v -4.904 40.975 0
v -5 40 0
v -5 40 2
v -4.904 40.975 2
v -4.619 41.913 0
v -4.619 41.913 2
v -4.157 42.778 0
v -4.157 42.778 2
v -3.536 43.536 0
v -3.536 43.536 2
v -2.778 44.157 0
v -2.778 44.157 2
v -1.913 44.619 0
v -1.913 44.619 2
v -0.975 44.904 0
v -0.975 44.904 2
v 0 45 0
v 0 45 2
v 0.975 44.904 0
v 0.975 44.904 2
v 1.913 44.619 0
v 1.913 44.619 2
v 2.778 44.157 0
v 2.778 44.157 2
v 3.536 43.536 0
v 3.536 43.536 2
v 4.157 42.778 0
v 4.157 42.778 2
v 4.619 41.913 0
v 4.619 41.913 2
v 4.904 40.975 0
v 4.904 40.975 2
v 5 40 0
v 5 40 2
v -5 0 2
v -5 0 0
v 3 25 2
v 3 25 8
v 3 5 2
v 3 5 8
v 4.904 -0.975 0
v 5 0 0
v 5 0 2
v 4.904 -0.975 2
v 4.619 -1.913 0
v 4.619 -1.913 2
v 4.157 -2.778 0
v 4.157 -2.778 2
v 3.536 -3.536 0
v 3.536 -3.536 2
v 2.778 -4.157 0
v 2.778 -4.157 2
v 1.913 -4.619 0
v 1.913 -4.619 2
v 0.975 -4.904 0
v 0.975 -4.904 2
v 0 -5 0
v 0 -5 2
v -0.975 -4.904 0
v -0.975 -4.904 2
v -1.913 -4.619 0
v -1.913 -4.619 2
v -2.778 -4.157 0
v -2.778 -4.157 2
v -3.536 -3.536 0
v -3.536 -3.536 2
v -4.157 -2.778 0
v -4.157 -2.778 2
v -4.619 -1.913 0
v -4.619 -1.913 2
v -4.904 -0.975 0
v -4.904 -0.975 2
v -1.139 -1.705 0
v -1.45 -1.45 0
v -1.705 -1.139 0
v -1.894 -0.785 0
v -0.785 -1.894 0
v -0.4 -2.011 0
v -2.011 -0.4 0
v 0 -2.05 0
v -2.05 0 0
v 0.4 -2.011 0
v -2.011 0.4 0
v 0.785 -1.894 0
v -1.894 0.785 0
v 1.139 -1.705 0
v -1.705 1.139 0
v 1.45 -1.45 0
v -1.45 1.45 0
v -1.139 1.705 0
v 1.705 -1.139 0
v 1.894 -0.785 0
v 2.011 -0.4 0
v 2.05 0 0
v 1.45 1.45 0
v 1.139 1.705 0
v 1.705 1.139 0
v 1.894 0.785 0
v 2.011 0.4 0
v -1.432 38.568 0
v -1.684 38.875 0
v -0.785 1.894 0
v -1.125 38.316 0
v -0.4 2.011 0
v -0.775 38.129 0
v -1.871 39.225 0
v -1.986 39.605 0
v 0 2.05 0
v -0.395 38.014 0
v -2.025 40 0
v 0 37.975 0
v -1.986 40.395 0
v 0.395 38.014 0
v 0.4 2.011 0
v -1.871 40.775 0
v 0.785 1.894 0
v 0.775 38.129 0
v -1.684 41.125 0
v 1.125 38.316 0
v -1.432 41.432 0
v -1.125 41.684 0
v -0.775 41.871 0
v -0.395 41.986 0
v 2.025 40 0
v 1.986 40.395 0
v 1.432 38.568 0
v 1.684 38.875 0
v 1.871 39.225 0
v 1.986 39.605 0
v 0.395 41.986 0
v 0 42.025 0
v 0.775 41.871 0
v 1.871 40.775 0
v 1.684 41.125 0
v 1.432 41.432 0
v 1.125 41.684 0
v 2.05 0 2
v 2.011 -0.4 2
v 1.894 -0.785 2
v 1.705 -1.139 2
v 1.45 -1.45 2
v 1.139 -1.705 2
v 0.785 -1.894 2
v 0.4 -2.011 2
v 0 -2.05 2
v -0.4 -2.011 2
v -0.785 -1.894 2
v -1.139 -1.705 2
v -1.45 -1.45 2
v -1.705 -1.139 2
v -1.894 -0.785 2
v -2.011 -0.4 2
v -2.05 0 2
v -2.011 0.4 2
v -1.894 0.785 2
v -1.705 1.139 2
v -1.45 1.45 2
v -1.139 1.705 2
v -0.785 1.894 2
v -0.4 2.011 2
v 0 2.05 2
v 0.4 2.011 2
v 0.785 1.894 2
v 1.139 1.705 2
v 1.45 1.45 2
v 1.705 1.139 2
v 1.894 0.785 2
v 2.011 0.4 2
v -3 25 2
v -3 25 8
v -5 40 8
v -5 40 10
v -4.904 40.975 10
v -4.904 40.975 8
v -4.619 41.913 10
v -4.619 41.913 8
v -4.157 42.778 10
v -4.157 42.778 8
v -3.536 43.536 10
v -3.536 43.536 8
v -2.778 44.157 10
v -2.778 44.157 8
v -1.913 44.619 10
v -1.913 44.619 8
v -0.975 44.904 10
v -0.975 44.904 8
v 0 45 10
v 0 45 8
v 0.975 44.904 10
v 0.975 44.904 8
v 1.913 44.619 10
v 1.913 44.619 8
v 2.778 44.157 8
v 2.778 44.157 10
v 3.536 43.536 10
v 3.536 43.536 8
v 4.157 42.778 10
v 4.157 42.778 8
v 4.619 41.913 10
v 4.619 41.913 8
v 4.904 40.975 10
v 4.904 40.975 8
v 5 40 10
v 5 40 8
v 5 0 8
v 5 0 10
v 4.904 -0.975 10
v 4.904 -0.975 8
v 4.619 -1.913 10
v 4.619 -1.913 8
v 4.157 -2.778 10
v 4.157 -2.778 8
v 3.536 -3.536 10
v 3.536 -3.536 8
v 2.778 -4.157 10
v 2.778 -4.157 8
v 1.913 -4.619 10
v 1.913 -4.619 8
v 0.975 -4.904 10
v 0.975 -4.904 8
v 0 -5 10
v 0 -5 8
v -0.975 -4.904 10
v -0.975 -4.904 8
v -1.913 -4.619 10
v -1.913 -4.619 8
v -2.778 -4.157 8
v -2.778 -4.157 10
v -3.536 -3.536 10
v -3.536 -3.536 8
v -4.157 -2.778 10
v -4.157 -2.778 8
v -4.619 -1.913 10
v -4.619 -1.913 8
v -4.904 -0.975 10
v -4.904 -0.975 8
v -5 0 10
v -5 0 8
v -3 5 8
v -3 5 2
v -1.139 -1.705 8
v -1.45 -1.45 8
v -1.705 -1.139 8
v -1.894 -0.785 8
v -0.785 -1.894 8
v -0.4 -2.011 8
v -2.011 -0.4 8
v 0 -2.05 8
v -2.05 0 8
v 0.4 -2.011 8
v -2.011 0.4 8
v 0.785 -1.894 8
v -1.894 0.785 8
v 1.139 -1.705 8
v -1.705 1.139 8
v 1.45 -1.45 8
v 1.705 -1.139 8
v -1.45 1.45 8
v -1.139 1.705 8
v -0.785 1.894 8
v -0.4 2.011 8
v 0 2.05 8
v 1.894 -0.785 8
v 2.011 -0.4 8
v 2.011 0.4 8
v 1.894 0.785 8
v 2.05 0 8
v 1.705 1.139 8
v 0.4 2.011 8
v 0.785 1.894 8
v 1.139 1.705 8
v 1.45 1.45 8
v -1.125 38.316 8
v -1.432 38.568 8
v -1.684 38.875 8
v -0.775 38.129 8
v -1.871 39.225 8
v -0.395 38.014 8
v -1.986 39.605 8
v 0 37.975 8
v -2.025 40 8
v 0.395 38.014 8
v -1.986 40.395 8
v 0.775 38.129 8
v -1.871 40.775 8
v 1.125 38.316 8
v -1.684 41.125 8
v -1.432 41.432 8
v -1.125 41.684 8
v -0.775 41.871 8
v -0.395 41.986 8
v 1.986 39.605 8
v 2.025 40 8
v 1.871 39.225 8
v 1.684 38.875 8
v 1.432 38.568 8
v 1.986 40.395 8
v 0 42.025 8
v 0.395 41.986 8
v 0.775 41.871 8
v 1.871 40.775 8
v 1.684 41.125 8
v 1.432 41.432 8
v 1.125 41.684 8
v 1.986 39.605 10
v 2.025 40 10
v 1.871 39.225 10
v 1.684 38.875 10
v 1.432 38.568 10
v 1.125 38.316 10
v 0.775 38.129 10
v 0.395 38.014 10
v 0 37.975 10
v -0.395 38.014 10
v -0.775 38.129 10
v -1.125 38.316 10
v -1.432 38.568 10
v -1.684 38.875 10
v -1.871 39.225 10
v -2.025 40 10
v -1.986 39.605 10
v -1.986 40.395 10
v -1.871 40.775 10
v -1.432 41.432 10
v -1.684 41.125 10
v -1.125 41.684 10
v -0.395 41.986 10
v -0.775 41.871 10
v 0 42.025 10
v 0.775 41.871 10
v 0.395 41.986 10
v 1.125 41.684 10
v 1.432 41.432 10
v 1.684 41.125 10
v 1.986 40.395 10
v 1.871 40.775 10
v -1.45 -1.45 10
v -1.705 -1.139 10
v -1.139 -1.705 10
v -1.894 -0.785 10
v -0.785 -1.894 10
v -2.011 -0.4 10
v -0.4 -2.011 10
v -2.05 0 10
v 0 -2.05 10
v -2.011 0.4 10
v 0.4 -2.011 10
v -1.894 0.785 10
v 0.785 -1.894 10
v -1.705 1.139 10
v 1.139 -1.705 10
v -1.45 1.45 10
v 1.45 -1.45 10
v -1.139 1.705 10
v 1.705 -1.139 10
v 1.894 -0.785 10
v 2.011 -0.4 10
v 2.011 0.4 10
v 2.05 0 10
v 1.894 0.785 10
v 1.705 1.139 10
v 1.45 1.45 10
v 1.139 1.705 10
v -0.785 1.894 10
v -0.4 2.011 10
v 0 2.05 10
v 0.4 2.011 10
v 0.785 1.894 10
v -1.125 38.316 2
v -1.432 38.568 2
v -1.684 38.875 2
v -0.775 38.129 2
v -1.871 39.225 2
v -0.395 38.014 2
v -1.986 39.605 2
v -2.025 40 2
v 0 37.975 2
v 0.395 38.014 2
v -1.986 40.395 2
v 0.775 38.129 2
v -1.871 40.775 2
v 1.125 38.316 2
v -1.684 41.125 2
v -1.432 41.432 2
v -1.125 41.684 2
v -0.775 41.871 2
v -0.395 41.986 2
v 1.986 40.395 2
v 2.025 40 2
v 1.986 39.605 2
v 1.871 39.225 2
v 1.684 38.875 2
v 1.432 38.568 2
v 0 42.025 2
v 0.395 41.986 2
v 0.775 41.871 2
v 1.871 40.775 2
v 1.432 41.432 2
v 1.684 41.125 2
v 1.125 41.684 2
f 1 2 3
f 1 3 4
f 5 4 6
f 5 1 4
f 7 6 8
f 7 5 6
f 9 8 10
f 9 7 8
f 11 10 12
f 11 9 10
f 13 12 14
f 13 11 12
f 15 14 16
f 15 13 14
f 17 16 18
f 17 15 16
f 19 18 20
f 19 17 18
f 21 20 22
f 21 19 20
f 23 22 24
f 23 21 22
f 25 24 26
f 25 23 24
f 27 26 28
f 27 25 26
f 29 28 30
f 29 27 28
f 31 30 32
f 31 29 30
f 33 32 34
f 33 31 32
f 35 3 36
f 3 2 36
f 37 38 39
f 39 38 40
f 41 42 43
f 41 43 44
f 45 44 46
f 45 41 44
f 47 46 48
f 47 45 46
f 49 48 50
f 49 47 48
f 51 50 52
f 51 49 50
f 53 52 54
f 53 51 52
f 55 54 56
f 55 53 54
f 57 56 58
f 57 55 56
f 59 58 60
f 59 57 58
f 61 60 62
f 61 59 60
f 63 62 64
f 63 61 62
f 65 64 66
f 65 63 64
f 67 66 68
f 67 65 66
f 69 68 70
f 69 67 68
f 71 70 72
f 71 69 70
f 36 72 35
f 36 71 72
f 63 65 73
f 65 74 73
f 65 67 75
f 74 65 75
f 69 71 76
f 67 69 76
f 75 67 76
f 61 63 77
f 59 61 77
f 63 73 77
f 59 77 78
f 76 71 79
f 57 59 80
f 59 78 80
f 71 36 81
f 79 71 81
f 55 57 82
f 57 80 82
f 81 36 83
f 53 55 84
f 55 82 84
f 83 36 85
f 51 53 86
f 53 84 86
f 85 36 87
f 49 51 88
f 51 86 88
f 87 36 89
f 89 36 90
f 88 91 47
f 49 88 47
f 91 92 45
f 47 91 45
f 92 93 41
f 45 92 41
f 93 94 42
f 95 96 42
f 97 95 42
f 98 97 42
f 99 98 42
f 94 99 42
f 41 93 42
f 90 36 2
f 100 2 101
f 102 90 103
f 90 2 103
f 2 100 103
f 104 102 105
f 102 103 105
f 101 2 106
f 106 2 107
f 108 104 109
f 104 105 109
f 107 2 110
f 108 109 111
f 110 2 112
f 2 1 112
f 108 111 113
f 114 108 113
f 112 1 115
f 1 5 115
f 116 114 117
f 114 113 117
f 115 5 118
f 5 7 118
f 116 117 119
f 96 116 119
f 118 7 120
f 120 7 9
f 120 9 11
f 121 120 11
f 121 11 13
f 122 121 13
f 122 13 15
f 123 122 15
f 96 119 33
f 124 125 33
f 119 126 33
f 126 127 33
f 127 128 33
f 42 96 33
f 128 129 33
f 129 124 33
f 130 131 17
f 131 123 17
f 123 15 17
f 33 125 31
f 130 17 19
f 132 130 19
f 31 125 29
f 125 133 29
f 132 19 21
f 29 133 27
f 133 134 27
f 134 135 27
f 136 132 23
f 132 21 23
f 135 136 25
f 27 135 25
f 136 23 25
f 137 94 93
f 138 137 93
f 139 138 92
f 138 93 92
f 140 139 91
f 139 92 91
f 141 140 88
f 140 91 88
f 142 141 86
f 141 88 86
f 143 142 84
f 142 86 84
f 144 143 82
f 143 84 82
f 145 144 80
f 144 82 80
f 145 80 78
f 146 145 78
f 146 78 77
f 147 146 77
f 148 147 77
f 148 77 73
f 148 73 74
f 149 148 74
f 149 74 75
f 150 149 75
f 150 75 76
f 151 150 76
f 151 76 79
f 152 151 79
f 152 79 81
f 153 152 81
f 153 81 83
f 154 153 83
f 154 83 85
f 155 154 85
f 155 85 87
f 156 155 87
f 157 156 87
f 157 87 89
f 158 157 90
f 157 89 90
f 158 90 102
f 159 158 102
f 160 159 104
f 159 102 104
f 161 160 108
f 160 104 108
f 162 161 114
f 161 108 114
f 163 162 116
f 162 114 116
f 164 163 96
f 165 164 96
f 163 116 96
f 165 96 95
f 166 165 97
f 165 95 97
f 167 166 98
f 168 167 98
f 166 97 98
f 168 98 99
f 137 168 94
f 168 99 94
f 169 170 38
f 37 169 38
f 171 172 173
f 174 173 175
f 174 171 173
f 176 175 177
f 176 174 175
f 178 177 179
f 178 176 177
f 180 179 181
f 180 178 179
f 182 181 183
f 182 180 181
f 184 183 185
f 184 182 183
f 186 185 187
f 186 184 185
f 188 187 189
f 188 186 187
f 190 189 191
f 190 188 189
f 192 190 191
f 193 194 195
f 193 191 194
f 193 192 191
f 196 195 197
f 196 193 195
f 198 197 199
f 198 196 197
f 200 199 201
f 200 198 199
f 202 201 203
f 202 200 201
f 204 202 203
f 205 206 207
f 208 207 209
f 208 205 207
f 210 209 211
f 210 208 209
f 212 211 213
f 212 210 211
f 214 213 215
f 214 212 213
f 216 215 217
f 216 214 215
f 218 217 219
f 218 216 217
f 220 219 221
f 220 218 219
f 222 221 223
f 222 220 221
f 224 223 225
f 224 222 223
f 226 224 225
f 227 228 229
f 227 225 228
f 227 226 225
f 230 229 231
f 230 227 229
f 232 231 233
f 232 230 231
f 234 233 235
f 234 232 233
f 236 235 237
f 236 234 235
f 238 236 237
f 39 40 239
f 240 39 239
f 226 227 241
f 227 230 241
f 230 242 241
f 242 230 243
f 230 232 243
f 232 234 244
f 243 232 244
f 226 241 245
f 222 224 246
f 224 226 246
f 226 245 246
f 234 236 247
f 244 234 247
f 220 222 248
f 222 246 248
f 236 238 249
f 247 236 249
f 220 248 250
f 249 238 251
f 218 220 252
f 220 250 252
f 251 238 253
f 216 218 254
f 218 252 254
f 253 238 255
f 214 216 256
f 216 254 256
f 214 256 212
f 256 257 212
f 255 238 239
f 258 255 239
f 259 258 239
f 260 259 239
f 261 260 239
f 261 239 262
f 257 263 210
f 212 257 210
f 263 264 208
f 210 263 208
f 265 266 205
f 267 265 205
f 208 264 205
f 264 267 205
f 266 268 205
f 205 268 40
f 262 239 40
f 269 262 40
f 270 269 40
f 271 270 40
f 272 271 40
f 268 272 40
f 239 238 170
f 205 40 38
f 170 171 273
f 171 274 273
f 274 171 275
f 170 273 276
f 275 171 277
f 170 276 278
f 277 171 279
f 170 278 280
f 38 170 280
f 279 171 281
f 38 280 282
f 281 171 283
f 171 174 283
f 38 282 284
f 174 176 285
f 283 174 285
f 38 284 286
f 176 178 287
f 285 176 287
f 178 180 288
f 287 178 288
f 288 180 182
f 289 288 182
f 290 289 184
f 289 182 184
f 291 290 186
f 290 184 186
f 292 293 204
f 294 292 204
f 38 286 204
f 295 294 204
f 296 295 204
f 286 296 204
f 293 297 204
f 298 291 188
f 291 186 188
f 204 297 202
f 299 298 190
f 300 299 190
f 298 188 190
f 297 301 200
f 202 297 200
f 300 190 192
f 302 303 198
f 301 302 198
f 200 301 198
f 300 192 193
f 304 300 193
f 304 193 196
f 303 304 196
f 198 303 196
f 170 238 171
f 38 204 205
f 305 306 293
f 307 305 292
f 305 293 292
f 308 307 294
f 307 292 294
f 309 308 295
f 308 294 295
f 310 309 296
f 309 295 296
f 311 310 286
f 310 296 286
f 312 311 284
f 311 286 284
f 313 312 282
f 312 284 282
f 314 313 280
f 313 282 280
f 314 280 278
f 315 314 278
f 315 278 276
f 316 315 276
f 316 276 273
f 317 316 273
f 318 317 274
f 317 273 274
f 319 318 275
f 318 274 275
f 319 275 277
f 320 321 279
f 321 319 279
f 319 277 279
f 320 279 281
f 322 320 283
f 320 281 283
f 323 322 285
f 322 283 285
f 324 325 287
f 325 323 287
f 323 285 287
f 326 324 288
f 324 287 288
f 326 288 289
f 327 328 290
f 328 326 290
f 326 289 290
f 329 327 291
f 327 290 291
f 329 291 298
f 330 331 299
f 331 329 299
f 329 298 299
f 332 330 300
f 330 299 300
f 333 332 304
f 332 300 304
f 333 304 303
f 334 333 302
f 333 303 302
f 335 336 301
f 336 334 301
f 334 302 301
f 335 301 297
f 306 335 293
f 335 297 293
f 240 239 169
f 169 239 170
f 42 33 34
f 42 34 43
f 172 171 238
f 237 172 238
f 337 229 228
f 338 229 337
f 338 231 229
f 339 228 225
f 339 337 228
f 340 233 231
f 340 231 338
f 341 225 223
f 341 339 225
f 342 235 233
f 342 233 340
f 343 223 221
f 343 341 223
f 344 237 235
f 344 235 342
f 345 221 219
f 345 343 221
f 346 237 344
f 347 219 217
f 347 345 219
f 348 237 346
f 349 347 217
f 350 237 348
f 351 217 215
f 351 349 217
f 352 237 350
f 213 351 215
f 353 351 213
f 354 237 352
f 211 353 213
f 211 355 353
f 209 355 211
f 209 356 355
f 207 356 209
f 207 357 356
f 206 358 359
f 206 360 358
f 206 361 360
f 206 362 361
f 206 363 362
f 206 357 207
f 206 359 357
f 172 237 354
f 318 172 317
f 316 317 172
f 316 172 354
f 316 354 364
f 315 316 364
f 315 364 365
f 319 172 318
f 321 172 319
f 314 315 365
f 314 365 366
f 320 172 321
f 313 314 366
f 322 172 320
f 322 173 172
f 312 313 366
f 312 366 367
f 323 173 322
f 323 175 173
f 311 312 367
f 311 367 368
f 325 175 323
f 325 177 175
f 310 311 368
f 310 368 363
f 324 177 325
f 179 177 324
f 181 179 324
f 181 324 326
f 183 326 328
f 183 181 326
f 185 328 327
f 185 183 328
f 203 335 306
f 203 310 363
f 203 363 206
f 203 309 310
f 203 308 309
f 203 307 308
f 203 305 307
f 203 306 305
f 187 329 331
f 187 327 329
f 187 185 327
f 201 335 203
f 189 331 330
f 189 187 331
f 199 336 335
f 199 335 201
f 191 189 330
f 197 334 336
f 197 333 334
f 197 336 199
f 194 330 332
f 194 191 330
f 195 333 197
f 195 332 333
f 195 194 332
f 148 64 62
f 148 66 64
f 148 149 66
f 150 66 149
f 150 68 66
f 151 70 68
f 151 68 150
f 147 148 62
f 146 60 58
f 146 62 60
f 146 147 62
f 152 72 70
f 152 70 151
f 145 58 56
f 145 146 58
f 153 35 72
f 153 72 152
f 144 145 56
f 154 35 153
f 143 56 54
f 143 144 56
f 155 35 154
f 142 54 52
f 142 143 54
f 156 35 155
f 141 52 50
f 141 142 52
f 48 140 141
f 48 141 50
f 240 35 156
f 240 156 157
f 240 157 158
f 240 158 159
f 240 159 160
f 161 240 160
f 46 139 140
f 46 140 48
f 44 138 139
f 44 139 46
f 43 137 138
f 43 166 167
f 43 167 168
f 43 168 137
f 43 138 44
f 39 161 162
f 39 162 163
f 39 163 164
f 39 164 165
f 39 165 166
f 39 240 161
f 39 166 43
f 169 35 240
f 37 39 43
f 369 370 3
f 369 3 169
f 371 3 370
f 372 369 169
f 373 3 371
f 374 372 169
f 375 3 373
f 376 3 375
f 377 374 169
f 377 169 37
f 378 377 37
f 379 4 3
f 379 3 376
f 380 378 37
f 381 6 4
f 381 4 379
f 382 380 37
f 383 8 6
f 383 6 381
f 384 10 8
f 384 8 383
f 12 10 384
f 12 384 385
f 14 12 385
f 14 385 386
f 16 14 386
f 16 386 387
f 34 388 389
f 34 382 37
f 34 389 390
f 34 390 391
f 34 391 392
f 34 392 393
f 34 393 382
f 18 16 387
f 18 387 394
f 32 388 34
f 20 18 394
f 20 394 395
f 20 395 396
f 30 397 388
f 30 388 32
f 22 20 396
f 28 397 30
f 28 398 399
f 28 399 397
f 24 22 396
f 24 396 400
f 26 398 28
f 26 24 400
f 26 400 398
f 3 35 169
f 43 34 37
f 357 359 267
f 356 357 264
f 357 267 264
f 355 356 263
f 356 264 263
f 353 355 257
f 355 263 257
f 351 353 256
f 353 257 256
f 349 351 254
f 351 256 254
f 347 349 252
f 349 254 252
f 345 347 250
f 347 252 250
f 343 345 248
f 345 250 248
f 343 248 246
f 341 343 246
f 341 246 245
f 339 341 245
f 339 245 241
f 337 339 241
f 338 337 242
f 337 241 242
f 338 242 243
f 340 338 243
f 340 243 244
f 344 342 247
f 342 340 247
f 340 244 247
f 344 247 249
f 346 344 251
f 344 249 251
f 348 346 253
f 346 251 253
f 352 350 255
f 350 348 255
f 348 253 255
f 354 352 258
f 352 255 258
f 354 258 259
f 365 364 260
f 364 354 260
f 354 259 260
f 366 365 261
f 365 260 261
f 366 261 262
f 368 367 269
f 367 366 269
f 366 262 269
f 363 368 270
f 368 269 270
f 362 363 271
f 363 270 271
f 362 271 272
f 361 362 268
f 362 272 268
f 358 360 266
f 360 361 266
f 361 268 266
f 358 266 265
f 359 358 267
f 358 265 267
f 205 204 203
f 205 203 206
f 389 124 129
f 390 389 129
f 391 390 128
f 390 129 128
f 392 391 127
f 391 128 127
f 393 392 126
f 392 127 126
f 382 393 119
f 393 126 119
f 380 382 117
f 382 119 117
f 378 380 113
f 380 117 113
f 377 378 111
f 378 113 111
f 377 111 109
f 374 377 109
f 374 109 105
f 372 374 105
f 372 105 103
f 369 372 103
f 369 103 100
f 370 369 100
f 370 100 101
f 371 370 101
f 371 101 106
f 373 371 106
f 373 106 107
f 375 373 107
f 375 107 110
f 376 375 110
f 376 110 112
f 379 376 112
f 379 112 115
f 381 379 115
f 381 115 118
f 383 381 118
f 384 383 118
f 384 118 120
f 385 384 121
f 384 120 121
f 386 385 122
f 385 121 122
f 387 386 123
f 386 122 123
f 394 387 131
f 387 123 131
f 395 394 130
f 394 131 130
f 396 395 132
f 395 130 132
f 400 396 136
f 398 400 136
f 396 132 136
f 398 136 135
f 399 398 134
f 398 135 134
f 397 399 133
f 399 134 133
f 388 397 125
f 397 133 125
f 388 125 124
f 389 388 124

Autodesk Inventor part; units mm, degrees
ref_plane "YZ Plane" through (0, 0, 0) normal (1, 0, 0) x (0, 1, 0)
ref_plane "XZ Plane" through (0, 0, 0) normal (0, 1, 0) x (-1, 0, 0)
ref_plane "XY Plane" through (0, 0, 0) normal (0, 0, 1) x (1, 0, 0)
sketch "Sketch1" plane through (0, 0, 0) normal (0, 0, 1) x (1, 0, 0)
  circle A0 centre (0, 0) radius 2.05
  arc A1 (-5, 0) -> (5, 0) centre (0, 0) ccw
  circle A2 centre (0, 40) radius 2.025
  arc A3 (5, 40) -> (-5, 40) centre (0, 40) ccw
  line L0 (-5, 40) -> (-5, 0)
  line L1 (5, 40) -> (5, 0)
  line L2 (0, 0) -> (0, 2.05)
  line L3 (0, 37.975) -> (0, 40)
  dimension "d0" = 4.1
  dimension "d3" = 4.05
  dimension "d1" = 10
  dimension "d2" = 40
  dimension "d4" = 10
extrude "Extrusion1" add sketch "Sketch1" along normal blind 10
shell "Shell1" thickness 2 removed faces 4 at (3.9972, 43.0037, 6.6667) at (-4.9838, -0.4023, 6.6667) at (-5, 13.3333, 3.3333) at (5, 26.6667, 3.3333)
sketch "Sketch2" plane through (0, 40, 8) normal (0, 0, -1) x (-1, 0, 0)
  line L0 (-3, -35) -> (3, -35)
  line L1 (3, -35) -> (3, -15)
  line L2 (3, -15) -> (-3, -15)
  line L3 (-3, -15) -> (-3, -35)
  circle A0 centre (0, 0) radius 2.025 projected
  point P0 (0, -40)
  dimension "d13" = 6
  dimension "d14" = 20
  dimension "d18" = 5
extrude "Extrusion2" add sketch "Sketch2" along normal blind 6 contours L3 L2 L1 L0
delete faces "Delete Face1" heal yes whole lump no faces at (4.0369, 0.3259, 4)
delete faces "Delete Face2" heal yes whole lump no faces at (4.0119, 40.3239, 4)
properties part number "Crank" material "Steel, Mild"
